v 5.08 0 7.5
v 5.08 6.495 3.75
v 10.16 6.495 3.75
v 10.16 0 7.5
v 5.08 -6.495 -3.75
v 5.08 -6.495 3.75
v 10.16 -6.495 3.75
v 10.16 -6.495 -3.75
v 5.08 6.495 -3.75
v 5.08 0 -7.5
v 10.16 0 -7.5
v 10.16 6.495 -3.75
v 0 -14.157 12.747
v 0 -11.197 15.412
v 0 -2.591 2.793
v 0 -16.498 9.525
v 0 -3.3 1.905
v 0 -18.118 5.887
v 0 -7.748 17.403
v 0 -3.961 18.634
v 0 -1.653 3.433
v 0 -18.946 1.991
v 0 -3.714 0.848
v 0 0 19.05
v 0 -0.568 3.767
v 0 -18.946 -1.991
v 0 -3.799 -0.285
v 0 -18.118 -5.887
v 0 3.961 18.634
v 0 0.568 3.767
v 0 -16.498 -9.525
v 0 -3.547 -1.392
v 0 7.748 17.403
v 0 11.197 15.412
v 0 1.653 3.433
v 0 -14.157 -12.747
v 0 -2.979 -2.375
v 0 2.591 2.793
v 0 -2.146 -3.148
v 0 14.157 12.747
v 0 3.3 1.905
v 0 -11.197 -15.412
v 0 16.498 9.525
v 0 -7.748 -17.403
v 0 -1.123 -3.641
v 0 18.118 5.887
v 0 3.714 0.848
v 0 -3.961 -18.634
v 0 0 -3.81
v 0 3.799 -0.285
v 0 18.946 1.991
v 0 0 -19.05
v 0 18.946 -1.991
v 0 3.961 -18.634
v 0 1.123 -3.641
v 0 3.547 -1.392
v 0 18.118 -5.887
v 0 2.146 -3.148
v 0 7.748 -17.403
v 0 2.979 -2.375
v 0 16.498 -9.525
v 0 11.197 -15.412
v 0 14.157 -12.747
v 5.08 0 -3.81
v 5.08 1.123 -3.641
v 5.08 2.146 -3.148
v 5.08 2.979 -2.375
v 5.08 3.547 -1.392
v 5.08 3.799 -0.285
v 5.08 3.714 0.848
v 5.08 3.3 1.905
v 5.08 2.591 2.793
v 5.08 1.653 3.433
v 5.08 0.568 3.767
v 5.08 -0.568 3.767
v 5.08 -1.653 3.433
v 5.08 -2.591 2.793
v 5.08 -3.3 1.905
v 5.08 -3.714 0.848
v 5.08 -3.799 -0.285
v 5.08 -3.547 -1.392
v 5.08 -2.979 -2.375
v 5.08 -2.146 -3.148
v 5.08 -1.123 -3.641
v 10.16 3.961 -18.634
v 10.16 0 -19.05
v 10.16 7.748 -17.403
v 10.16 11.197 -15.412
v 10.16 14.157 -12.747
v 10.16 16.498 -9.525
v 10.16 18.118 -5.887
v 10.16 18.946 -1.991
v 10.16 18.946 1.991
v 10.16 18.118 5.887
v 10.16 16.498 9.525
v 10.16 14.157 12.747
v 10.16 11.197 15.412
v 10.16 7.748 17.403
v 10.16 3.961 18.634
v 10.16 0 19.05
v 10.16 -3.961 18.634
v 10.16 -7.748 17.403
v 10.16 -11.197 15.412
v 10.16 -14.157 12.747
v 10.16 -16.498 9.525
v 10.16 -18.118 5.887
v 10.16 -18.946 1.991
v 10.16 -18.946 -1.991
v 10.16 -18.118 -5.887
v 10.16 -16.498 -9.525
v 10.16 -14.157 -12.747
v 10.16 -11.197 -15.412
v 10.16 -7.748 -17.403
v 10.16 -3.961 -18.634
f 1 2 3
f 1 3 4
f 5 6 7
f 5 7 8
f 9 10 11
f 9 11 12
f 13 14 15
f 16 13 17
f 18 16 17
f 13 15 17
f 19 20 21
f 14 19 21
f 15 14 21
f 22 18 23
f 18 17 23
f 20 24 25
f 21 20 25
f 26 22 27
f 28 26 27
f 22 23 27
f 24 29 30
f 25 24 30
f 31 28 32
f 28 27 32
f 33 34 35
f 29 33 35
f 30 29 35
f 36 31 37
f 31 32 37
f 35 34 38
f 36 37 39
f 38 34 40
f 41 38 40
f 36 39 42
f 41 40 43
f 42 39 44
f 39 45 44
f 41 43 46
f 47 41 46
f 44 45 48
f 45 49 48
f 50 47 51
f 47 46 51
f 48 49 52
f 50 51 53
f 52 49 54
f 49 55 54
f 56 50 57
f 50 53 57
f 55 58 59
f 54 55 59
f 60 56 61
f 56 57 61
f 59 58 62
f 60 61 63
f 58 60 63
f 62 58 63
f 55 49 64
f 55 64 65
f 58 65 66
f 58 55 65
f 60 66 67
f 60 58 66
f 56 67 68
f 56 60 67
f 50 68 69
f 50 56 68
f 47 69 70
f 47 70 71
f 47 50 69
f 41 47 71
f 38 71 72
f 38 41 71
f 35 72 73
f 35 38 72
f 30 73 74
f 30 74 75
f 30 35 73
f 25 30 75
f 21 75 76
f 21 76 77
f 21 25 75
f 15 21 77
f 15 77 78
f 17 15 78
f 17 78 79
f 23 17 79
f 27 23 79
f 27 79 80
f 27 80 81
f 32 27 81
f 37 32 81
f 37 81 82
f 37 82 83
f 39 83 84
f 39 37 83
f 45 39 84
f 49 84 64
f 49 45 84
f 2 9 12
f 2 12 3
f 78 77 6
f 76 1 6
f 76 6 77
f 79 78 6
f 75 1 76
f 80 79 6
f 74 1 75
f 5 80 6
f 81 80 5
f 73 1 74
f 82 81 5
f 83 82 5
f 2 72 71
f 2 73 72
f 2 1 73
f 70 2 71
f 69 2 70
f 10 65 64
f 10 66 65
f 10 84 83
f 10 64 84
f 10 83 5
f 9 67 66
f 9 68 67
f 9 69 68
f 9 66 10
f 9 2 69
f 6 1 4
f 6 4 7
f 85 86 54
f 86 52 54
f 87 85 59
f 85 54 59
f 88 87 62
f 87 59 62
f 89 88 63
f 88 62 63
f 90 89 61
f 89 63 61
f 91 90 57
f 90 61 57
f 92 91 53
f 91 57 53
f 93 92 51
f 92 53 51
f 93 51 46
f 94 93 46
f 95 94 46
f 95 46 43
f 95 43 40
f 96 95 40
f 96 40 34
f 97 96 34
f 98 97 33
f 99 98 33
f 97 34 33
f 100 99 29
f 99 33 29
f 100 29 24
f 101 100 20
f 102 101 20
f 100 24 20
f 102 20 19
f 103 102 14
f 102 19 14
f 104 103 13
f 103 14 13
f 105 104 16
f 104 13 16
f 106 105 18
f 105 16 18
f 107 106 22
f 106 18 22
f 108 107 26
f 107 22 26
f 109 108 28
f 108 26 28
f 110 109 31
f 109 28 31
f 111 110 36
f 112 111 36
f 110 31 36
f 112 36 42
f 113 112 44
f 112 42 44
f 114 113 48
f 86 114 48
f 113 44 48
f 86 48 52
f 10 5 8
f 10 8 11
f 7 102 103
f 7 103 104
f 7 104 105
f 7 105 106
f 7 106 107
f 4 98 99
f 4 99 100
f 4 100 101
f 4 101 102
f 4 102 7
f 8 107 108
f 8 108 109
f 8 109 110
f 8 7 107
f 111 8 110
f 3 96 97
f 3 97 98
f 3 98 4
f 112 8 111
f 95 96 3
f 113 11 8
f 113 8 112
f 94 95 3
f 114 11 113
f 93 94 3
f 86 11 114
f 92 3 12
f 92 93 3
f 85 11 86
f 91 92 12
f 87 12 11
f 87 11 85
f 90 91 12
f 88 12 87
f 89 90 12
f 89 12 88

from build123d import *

# Parameters (mm, degrees)
SKETCH1_R           = 19.05
SKETCH1_R_2         = 3.81
BOSS_EXTRUDE1_DEPTH = 5.08
SKETCH2_R           = 19.05
BOSS_EXTRUDE2_DEPTH = 5.08


with BuildPart() as part:
    # Sketch1 → Boss-Extrude1 (new body)
    with BuildSketch(Plane(origin=(0, 0, 0), x_dir=(0, 0, -1), z_dir=(1, 0, 0))):
        Circle(SKETCH1_R)
        Circle(SKETCH1_R_2, mode=Mode.SUBTRACT)
    extrude(amount=BOSS_EXTRUDE1_DEPTH)

    # Sketch2 → Boss-Extrude2 (add)
    with BuildSketch(Plane(origin=(5.08, 0, 0), x_dir=(0, 0, -1), z_dir=(1, 0, 0))):
        Circle(SKETCH2_R)
        Polygon((7.5, 0), (3.75, 6.495190528), (-3.75, 6.495190528), (-7.5, 0), (-3.75, -6.495190528), (3.75, -6.495190528), align=None, mode=Mode.SUBTRACT)
    extrude(amount=BOSS_EXTRUDE2_DEPTH)


solid = part.part
